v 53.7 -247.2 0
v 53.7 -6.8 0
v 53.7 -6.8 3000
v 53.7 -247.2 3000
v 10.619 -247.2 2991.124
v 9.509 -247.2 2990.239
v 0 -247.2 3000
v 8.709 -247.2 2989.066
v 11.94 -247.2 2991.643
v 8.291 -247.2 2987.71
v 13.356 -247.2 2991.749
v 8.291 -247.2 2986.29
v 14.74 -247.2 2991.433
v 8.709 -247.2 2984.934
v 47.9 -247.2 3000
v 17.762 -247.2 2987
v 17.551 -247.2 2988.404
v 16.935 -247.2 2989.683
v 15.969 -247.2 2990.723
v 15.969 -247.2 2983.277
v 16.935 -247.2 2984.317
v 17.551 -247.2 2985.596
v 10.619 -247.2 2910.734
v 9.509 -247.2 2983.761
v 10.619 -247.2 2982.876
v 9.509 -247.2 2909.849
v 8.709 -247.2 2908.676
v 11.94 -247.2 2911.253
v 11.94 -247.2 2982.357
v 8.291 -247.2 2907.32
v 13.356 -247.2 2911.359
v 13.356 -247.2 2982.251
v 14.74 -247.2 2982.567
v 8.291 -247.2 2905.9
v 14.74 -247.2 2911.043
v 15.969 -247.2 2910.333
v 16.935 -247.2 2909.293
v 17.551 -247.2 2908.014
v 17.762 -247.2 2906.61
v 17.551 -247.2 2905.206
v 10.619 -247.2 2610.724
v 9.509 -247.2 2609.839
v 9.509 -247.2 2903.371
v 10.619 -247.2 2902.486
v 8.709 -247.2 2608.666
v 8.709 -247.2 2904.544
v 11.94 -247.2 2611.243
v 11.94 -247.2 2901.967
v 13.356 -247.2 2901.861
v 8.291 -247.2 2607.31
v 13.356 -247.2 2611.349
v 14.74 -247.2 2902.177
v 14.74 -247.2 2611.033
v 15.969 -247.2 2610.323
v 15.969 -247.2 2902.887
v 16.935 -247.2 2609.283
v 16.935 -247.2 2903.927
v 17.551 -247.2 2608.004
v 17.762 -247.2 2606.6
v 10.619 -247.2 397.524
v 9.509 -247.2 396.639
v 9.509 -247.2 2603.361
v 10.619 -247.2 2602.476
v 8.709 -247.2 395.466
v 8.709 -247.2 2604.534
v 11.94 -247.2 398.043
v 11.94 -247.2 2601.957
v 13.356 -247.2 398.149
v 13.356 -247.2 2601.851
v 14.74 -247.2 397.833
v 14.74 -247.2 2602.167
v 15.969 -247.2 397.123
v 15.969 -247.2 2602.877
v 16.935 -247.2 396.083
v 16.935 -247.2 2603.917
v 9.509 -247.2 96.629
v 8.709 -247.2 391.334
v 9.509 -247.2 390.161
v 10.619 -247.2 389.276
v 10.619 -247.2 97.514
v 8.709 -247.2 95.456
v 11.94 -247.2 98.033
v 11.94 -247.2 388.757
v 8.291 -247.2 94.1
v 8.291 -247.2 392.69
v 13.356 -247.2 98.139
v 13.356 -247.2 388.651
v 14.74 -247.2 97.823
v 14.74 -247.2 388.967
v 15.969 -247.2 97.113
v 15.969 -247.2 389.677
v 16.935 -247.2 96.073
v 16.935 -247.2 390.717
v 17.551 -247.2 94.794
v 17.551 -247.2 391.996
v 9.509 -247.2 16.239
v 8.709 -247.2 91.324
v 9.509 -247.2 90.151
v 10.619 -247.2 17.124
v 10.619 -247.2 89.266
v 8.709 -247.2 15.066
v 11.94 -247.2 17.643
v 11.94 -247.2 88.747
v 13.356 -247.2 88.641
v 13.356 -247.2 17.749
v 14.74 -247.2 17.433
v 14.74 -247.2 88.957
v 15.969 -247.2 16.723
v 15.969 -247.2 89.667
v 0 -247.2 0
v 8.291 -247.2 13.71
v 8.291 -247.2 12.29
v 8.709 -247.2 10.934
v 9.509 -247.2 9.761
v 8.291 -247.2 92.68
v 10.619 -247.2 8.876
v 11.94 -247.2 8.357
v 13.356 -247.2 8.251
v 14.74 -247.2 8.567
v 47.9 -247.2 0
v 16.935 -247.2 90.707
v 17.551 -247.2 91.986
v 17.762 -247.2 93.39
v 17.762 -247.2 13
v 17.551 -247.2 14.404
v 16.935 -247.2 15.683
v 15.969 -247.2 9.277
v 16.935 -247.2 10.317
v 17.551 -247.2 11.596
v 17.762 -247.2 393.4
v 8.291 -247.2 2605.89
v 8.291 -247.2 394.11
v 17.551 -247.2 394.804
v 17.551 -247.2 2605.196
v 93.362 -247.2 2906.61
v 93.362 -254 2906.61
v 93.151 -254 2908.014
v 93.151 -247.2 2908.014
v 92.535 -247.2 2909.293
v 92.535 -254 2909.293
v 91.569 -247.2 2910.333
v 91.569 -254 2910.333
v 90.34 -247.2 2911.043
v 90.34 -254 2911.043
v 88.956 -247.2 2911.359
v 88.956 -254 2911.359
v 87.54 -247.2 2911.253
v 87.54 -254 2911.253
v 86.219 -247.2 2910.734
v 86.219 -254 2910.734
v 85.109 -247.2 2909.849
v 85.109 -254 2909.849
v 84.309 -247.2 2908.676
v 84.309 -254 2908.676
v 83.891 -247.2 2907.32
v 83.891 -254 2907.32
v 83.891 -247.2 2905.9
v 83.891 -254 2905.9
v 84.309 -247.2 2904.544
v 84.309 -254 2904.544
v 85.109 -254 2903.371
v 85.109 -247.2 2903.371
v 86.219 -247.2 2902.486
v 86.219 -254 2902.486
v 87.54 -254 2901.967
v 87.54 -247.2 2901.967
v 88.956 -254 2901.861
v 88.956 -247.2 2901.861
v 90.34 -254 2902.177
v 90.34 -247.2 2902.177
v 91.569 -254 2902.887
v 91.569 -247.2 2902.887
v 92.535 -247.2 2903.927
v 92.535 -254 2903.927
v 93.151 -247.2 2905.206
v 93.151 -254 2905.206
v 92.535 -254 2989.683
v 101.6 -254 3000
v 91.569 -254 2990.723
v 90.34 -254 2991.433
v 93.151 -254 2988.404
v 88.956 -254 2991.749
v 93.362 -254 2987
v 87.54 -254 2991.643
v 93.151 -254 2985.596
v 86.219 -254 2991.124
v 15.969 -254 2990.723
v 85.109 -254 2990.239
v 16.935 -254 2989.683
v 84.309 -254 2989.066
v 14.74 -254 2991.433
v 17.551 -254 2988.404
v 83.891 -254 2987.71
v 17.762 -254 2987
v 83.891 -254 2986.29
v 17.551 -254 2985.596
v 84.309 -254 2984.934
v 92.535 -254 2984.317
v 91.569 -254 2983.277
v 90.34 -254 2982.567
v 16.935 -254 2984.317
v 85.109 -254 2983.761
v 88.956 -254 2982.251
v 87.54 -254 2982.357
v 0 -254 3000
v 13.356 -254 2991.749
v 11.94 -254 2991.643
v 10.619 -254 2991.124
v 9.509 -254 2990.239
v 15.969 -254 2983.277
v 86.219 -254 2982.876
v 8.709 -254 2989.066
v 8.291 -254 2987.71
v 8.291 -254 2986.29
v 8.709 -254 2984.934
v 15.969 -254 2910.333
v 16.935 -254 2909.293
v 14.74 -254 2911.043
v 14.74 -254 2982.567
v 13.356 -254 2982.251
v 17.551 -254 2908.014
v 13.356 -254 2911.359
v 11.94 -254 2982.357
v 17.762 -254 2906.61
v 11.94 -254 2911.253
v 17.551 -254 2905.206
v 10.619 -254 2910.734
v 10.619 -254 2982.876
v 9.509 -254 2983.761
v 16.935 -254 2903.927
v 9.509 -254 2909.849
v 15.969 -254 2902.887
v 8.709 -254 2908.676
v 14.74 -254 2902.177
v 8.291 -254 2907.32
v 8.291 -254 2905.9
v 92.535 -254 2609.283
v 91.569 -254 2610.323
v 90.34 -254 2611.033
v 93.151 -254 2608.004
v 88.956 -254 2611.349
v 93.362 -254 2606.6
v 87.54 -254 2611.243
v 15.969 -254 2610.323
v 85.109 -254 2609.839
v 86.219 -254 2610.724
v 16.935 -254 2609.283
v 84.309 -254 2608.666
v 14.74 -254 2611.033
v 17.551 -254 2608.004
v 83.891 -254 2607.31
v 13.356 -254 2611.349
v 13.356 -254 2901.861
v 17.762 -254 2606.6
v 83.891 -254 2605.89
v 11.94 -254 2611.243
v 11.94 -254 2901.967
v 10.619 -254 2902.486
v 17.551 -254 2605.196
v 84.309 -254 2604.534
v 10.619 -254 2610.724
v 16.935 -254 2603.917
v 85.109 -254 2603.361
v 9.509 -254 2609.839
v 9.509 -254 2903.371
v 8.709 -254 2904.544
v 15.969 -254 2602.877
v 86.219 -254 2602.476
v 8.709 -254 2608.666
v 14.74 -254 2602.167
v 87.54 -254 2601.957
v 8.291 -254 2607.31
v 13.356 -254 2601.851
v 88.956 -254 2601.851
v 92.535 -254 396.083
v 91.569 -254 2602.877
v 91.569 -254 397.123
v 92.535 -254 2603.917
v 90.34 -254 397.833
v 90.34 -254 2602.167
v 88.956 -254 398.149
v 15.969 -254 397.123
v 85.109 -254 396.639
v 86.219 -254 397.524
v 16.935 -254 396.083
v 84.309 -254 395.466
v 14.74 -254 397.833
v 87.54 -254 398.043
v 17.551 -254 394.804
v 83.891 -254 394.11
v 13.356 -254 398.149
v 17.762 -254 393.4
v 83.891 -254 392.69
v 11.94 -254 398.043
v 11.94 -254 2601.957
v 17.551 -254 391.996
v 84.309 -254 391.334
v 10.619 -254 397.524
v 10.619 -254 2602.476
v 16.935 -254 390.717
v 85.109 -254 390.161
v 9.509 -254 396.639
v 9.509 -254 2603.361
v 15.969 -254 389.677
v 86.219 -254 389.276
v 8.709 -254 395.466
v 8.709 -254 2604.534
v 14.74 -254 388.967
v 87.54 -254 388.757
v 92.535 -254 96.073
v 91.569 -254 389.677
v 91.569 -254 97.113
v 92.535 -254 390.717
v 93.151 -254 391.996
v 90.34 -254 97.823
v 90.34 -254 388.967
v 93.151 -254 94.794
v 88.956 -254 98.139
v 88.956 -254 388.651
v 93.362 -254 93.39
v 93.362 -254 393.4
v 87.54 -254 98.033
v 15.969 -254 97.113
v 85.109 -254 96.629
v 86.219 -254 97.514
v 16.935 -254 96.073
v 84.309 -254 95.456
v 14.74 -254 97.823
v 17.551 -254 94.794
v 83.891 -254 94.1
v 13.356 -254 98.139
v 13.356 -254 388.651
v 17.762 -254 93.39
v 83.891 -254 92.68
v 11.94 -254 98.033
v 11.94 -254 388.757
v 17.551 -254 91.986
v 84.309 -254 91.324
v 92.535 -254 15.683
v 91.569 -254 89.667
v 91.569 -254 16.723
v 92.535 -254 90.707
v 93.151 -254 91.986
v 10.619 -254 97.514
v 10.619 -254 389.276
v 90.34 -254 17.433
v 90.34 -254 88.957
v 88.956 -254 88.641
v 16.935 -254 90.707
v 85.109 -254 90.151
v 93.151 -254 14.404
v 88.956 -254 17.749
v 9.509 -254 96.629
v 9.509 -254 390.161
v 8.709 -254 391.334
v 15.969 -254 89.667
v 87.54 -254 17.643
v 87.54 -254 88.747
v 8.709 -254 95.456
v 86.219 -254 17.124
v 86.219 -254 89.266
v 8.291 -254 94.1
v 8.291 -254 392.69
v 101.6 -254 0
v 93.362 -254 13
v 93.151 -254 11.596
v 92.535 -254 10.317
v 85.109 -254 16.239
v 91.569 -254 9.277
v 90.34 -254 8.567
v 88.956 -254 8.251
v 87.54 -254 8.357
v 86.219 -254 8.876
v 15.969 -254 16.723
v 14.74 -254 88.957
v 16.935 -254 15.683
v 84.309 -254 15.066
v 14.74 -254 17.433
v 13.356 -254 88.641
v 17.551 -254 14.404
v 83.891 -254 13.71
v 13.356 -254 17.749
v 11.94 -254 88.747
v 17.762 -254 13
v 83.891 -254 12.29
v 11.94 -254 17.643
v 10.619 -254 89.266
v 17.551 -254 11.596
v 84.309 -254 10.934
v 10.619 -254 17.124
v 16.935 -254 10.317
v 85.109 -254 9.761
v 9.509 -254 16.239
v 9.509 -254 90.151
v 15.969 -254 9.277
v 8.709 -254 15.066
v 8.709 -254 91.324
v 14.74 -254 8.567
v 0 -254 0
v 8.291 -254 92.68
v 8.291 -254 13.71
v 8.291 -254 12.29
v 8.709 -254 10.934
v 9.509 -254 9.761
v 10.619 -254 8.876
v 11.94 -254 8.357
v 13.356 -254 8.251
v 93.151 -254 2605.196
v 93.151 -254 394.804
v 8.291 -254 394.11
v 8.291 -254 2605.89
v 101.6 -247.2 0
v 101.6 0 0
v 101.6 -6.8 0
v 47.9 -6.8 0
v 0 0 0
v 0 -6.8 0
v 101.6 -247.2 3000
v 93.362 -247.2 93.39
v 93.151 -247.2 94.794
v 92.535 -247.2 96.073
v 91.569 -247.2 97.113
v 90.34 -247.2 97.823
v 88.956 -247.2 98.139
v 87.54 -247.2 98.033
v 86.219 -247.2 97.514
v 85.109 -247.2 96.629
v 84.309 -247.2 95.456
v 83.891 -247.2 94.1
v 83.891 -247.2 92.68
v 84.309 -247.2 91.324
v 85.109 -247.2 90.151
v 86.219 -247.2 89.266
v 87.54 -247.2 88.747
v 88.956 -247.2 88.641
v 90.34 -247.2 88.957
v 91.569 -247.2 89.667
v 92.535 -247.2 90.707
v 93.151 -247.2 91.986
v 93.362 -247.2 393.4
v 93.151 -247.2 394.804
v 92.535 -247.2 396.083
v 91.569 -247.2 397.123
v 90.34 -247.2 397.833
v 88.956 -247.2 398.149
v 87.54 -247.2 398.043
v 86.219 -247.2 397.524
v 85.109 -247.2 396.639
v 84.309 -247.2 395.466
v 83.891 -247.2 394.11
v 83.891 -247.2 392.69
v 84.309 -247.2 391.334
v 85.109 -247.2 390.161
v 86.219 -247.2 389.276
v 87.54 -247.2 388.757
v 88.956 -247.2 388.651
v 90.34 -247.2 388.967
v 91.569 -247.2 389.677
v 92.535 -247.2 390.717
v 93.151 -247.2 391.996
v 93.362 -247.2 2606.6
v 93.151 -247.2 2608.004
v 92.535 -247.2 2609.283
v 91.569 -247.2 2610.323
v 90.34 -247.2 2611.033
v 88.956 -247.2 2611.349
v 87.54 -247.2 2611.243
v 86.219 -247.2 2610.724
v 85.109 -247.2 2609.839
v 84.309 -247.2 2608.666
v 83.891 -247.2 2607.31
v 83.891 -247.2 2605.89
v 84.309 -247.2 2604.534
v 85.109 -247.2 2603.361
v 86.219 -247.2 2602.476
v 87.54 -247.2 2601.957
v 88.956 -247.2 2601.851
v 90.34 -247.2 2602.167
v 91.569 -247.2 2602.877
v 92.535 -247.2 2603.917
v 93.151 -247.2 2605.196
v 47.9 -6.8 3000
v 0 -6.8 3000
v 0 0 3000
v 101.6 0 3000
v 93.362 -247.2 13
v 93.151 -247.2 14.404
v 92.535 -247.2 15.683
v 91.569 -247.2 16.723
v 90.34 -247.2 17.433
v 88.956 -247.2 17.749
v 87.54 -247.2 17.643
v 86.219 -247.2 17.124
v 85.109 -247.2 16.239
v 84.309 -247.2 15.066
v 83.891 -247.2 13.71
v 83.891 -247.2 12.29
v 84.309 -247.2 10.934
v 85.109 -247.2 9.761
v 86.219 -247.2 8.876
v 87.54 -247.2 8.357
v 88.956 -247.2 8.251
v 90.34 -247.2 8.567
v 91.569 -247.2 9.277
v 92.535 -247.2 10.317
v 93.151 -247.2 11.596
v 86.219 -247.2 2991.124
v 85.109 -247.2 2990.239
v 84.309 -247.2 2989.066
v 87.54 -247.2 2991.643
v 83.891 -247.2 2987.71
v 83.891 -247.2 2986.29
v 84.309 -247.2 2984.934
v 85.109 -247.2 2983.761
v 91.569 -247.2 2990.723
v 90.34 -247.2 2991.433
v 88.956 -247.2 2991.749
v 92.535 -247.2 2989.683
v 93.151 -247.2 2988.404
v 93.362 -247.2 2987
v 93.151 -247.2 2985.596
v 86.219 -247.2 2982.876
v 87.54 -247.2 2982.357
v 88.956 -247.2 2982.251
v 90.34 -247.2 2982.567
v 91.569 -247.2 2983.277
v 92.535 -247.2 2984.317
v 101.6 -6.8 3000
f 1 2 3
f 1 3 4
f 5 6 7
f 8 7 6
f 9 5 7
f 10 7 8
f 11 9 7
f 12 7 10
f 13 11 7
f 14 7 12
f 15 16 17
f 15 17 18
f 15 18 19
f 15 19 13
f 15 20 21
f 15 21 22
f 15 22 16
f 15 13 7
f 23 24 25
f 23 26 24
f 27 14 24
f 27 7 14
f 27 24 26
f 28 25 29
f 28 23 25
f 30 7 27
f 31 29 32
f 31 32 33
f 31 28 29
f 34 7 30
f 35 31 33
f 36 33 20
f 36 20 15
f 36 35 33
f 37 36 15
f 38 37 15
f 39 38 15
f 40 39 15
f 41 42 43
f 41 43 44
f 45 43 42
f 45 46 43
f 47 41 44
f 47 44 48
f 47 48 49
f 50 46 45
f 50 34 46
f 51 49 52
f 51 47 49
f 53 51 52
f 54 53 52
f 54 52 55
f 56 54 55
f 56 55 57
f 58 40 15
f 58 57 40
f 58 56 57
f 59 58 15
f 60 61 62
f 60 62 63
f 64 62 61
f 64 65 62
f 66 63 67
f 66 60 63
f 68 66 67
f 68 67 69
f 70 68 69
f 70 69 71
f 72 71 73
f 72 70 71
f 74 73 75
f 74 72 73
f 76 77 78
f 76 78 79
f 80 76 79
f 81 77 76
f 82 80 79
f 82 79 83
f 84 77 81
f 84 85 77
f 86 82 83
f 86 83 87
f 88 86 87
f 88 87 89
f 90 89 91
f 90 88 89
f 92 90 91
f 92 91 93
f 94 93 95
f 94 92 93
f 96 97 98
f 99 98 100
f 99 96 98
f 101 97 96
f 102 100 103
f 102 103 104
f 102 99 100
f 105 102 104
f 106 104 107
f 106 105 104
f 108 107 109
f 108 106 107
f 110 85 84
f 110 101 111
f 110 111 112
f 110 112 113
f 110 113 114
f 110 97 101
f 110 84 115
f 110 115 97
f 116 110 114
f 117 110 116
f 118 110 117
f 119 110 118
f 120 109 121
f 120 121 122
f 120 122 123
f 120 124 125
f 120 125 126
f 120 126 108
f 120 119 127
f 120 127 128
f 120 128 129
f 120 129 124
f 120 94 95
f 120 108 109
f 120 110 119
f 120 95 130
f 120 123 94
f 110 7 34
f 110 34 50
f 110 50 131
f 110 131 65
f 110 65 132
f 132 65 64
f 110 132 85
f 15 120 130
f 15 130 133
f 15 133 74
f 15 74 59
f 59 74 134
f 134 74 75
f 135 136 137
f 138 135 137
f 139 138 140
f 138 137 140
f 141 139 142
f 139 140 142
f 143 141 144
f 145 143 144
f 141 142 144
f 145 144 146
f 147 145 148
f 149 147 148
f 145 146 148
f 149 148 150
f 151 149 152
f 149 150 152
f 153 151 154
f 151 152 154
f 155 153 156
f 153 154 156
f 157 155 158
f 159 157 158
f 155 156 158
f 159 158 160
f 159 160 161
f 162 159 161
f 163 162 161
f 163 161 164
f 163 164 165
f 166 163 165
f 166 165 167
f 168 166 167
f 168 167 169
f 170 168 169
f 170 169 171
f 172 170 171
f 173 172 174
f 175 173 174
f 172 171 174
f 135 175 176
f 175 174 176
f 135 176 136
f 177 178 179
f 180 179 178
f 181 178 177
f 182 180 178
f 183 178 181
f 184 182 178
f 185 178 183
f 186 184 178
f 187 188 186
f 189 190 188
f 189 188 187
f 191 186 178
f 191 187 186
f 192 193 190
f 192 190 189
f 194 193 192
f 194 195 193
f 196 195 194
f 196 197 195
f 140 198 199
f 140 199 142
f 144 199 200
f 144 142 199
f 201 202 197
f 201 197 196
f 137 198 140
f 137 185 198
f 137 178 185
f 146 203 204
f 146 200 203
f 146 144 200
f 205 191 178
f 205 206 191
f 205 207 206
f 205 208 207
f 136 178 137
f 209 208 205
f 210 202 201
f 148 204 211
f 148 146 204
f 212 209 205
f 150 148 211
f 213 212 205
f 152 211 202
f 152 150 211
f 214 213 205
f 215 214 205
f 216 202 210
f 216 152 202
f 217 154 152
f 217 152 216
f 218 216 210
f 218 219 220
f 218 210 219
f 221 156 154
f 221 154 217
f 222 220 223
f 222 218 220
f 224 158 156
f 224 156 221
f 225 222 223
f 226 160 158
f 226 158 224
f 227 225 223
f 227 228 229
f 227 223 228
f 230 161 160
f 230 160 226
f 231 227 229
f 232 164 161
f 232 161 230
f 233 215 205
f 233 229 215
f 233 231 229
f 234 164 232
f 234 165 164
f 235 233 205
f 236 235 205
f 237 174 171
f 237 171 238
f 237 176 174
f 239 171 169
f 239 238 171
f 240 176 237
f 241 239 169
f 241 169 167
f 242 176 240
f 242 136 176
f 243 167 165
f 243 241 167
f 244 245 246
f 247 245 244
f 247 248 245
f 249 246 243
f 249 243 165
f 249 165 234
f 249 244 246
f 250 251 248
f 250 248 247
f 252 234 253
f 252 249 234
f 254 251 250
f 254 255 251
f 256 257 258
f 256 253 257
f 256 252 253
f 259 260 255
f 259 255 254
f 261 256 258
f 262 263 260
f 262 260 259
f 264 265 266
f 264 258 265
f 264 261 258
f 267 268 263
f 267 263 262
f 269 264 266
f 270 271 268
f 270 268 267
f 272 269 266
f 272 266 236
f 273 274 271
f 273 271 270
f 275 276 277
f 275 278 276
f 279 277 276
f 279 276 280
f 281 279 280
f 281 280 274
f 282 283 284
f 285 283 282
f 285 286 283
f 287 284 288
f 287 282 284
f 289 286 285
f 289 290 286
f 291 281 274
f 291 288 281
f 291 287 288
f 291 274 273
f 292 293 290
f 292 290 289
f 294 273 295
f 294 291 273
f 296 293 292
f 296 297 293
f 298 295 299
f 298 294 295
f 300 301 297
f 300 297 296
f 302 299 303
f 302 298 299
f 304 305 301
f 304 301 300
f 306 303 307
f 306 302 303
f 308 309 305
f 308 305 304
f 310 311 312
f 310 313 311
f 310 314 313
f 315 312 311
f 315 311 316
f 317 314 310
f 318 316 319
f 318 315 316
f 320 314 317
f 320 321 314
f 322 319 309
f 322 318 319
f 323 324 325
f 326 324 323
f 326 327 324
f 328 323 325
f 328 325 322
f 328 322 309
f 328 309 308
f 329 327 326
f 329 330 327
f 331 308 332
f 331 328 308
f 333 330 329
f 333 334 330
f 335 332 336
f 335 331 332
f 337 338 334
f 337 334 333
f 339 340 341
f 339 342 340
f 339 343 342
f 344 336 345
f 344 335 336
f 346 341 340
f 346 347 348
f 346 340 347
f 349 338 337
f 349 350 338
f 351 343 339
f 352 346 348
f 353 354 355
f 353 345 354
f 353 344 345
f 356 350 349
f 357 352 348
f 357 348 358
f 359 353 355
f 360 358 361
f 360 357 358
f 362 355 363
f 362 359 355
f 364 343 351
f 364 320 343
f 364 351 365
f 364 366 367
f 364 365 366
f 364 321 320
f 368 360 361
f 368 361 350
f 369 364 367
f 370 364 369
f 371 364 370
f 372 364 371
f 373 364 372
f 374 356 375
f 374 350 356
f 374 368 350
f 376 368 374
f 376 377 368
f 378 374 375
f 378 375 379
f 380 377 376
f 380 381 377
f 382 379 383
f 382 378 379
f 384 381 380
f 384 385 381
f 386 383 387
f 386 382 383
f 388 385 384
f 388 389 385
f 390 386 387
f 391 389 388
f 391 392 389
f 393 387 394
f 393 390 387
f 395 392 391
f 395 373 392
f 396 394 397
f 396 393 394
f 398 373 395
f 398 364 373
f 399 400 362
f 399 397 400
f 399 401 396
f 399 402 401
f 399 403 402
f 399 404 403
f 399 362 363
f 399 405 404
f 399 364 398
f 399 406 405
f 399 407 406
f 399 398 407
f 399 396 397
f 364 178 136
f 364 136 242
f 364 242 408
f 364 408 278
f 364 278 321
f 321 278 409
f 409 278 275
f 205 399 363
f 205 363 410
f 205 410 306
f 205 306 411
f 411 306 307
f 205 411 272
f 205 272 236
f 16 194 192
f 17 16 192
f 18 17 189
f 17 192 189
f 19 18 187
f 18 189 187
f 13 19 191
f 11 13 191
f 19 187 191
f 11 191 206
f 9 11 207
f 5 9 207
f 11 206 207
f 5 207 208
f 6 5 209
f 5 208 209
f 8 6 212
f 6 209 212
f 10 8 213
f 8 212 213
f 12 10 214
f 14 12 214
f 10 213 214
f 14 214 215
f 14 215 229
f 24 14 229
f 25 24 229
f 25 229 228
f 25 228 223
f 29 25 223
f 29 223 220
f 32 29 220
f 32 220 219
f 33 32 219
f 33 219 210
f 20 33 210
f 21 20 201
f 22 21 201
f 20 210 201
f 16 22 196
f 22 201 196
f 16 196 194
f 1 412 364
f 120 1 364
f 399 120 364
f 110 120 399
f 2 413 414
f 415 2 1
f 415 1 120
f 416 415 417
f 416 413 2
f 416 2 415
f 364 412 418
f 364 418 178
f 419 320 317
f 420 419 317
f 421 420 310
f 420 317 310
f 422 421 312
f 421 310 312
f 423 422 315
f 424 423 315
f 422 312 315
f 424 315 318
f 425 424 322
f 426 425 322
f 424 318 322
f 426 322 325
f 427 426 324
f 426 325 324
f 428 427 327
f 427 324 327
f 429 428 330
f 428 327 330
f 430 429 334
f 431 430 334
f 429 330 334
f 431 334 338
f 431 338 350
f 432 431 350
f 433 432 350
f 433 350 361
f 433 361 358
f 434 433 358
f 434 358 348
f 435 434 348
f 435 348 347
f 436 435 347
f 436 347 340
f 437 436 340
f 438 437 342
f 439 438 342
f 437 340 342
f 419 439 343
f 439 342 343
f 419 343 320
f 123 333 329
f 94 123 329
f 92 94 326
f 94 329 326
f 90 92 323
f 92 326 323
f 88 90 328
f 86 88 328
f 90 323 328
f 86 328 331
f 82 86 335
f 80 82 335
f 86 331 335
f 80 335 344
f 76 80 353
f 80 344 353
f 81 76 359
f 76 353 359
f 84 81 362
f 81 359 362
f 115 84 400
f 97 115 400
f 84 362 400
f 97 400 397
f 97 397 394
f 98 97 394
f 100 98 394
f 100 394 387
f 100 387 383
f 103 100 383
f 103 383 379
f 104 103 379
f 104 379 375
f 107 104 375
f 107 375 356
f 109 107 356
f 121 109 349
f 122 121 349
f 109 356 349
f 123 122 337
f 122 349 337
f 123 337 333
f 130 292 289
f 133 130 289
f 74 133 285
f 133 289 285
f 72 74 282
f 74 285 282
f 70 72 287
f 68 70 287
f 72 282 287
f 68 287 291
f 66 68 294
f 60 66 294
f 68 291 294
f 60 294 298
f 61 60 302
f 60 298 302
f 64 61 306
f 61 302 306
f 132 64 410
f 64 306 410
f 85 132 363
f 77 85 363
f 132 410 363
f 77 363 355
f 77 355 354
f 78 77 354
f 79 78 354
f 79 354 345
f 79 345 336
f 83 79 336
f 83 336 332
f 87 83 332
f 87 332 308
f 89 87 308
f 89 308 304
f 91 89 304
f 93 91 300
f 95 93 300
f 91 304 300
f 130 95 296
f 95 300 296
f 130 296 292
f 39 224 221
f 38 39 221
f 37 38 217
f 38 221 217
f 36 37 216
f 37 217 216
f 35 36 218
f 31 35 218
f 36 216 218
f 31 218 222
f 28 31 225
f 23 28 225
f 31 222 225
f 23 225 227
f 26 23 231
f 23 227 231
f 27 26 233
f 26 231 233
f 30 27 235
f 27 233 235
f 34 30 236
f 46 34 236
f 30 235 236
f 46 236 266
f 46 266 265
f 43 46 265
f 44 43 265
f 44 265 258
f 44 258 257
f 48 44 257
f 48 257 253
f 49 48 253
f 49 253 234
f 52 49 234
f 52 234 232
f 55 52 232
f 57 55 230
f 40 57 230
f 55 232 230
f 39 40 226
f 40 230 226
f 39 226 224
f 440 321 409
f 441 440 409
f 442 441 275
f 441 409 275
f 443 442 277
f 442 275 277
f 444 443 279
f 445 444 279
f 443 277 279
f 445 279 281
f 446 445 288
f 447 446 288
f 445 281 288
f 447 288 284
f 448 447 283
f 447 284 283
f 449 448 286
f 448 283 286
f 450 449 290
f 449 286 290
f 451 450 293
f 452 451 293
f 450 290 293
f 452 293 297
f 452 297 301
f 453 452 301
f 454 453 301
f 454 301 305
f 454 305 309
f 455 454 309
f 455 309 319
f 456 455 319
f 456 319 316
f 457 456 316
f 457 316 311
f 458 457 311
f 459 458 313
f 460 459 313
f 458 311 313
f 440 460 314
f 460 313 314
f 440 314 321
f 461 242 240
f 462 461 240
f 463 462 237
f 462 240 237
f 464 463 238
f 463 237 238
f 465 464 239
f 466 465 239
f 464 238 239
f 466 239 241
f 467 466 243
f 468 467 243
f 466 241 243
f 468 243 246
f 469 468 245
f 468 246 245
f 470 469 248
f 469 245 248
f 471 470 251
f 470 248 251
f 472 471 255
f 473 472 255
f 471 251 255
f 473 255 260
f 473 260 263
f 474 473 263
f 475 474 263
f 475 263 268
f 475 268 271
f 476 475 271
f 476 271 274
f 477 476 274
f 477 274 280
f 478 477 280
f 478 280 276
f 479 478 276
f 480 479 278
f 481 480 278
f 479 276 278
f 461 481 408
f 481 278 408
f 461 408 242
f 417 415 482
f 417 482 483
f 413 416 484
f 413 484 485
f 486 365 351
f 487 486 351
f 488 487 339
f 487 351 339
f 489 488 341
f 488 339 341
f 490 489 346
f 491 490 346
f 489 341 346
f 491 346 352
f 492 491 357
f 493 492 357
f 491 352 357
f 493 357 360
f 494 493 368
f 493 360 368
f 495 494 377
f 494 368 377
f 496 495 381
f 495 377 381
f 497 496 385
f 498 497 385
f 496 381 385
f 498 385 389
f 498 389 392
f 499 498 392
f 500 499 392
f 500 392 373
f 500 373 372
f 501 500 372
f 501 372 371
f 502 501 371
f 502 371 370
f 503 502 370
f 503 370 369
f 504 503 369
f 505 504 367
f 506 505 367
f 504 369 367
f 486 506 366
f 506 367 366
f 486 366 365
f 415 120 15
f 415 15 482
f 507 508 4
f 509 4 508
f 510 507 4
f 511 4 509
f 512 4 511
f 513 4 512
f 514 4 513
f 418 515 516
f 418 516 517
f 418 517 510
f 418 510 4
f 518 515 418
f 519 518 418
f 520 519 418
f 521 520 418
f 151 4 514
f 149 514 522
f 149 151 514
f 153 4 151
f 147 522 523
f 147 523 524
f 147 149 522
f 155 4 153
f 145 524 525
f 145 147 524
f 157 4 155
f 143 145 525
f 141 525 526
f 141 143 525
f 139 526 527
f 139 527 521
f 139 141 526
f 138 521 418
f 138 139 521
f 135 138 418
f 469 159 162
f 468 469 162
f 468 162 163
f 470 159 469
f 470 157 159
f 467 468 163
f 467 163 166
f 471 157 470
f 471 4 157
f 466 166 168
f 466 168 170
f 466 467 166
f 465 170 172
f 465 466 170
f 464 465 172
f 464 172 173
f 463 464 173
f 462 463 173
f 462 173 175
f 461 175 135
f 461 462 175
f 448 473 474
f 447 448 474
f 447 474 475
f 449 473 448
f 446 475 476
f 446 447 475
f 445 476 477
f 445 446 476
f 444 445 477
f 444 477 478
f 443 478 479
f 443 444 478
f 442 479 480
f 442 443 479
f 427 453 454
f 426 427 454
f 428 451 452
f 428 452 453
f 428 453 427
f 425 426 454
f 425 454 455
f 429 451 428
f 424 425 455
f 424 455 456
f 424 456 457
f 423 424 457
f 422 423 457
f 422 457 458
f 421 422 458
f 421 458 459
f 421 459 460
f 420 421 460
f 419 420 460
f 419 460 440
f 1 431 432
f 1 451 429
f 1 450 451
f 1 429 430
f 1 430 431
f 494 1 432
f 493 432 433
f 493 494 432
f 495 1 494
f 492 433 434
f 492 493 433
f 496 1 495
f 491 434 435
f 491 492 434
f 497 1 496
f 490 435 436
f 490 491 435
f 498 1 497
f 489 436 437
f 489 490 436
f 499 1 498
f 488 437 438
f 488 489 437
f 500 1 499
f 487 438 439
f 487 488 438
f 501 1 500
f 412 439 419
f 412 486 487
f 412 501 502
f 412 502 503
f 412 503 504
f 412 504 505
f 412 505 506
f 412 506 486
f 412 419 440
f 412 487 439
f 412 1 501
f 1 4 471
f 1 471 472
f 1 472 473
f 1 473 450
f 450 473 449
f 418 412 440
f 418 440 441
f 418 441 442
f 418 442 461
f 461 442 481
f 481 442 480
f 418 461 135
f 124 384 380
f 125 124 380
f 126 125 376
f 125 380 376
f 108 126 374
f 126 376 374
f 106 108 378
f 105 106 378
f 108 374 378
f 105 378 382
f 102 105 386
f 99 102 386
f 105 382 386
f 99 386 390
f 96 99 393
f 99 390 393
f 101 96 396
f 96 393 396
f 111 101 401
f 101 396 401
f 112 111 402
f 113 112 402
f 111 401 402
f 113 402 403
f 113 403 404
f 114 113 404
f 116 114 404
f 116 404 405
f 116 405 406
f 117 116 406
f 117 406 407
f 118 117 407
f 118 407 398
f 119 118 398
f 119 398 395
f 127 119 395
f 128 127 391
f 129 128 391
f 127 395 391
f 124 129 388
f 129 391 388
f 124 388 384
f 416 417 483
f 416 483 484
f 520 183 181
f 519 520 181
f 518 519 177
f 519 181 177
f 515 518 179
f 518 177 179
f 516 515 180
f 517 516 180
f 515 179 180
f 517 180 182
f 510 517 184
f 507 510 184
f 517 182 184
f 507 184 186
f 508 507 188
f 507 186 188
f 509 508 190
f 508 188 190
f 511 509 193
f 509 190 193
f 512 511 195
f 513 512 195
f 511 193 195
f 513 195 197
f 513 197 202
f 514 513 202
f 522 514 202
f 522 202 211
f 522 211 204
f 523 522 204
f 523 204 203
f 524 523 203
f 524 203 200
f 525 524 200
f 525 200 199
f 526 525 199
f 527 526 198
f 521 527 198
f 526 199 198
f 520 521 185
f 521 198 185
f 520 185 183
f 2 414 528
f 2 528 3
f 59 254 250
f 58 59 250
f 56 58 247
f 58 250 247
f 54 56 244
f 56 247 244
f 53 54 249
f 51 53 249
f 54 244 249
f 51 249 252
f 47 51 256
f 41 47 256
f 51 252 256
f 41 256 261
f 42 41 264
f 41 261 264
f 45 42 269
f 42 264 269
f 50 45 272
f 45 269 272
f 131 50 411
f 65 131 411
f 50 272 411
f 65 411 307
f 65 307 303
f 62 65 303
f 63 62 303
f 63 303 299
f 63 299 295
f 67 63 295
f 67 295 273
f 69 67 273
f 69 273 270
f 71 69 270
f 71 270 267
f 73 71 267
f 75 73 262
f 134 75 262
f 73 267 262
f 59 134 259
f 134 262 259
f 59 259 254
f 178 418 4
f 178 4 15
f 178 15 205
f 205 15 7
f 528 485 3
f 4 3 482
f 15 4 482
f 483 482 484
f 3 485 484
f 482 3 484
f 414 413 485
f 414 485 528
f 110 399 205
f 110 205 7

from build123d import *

# Parameters (mm, degrees)
SALIENTE_EXTRUIR1_DEPTH = 3000
CROQUIS2_R              = 4.7625
CORTAR_EXTRUIR1_DEPTH   = 6.8


with BuildPart() as part:
    # Croquis1 → Saliente-Extruir1 (new body)
    with BuildSketch(Plane.XY):
        Polygon((0, 0), (101.6, 0), (101.6, -6.8), (53.7, -6.8), (53.7, -247.2), (101.6, -247.2), (101.6, -254), (0, -254), (0, -247.2), (47.9, -247.2), (47.9, -6.8), (0, -6.8), align=None)
    extrude(amount=SALIENTE_EXTRUIR1_DEPTH)

    # Croquis2 → Cortar-Extruir1 (cut)
    with BuildSketch(Plane.XZ.offset(254)):
        with Locations((88.6, 2987)):
            Circle(CROQUIS2_R)
        with Locations((88.6, 2906.61)):
            Circle(CROQUIS2_R)
        with Locations((13, 2906.61)):
            Circle(CROQUIS2_R)
        with Locations((13, 2987)):
            Circle(CROQUIS2_R)
        with Locations((13, 13)):
            Circle(CROQUIS2_R)
        with Locations((13, 93.39)):
            Circle(CROQUIS2_R)
        with Locations((88.6, 93.39)):
            Circle(CROQUIS2_R)
        with Locations((88.6, 13)):
            Circle(CROQUIS2_R)
        with Locations((88.6, 2606.6)):
            Circle(CROQUIS2_R)
        with Locations((13, 2606.6)):
            Circle(CROQUIS2_R)
        with Locations((13, 393.4)):
            Circle(CROQUIS2_R)
        with Locations((88.6, 393.4)):
            Circle(CROQUIS2_R)
    extrude(amount=-CORTAR_EXTRUIR1_DEPTH, mode=Mode.SUBTRACT)


solid = part.part
